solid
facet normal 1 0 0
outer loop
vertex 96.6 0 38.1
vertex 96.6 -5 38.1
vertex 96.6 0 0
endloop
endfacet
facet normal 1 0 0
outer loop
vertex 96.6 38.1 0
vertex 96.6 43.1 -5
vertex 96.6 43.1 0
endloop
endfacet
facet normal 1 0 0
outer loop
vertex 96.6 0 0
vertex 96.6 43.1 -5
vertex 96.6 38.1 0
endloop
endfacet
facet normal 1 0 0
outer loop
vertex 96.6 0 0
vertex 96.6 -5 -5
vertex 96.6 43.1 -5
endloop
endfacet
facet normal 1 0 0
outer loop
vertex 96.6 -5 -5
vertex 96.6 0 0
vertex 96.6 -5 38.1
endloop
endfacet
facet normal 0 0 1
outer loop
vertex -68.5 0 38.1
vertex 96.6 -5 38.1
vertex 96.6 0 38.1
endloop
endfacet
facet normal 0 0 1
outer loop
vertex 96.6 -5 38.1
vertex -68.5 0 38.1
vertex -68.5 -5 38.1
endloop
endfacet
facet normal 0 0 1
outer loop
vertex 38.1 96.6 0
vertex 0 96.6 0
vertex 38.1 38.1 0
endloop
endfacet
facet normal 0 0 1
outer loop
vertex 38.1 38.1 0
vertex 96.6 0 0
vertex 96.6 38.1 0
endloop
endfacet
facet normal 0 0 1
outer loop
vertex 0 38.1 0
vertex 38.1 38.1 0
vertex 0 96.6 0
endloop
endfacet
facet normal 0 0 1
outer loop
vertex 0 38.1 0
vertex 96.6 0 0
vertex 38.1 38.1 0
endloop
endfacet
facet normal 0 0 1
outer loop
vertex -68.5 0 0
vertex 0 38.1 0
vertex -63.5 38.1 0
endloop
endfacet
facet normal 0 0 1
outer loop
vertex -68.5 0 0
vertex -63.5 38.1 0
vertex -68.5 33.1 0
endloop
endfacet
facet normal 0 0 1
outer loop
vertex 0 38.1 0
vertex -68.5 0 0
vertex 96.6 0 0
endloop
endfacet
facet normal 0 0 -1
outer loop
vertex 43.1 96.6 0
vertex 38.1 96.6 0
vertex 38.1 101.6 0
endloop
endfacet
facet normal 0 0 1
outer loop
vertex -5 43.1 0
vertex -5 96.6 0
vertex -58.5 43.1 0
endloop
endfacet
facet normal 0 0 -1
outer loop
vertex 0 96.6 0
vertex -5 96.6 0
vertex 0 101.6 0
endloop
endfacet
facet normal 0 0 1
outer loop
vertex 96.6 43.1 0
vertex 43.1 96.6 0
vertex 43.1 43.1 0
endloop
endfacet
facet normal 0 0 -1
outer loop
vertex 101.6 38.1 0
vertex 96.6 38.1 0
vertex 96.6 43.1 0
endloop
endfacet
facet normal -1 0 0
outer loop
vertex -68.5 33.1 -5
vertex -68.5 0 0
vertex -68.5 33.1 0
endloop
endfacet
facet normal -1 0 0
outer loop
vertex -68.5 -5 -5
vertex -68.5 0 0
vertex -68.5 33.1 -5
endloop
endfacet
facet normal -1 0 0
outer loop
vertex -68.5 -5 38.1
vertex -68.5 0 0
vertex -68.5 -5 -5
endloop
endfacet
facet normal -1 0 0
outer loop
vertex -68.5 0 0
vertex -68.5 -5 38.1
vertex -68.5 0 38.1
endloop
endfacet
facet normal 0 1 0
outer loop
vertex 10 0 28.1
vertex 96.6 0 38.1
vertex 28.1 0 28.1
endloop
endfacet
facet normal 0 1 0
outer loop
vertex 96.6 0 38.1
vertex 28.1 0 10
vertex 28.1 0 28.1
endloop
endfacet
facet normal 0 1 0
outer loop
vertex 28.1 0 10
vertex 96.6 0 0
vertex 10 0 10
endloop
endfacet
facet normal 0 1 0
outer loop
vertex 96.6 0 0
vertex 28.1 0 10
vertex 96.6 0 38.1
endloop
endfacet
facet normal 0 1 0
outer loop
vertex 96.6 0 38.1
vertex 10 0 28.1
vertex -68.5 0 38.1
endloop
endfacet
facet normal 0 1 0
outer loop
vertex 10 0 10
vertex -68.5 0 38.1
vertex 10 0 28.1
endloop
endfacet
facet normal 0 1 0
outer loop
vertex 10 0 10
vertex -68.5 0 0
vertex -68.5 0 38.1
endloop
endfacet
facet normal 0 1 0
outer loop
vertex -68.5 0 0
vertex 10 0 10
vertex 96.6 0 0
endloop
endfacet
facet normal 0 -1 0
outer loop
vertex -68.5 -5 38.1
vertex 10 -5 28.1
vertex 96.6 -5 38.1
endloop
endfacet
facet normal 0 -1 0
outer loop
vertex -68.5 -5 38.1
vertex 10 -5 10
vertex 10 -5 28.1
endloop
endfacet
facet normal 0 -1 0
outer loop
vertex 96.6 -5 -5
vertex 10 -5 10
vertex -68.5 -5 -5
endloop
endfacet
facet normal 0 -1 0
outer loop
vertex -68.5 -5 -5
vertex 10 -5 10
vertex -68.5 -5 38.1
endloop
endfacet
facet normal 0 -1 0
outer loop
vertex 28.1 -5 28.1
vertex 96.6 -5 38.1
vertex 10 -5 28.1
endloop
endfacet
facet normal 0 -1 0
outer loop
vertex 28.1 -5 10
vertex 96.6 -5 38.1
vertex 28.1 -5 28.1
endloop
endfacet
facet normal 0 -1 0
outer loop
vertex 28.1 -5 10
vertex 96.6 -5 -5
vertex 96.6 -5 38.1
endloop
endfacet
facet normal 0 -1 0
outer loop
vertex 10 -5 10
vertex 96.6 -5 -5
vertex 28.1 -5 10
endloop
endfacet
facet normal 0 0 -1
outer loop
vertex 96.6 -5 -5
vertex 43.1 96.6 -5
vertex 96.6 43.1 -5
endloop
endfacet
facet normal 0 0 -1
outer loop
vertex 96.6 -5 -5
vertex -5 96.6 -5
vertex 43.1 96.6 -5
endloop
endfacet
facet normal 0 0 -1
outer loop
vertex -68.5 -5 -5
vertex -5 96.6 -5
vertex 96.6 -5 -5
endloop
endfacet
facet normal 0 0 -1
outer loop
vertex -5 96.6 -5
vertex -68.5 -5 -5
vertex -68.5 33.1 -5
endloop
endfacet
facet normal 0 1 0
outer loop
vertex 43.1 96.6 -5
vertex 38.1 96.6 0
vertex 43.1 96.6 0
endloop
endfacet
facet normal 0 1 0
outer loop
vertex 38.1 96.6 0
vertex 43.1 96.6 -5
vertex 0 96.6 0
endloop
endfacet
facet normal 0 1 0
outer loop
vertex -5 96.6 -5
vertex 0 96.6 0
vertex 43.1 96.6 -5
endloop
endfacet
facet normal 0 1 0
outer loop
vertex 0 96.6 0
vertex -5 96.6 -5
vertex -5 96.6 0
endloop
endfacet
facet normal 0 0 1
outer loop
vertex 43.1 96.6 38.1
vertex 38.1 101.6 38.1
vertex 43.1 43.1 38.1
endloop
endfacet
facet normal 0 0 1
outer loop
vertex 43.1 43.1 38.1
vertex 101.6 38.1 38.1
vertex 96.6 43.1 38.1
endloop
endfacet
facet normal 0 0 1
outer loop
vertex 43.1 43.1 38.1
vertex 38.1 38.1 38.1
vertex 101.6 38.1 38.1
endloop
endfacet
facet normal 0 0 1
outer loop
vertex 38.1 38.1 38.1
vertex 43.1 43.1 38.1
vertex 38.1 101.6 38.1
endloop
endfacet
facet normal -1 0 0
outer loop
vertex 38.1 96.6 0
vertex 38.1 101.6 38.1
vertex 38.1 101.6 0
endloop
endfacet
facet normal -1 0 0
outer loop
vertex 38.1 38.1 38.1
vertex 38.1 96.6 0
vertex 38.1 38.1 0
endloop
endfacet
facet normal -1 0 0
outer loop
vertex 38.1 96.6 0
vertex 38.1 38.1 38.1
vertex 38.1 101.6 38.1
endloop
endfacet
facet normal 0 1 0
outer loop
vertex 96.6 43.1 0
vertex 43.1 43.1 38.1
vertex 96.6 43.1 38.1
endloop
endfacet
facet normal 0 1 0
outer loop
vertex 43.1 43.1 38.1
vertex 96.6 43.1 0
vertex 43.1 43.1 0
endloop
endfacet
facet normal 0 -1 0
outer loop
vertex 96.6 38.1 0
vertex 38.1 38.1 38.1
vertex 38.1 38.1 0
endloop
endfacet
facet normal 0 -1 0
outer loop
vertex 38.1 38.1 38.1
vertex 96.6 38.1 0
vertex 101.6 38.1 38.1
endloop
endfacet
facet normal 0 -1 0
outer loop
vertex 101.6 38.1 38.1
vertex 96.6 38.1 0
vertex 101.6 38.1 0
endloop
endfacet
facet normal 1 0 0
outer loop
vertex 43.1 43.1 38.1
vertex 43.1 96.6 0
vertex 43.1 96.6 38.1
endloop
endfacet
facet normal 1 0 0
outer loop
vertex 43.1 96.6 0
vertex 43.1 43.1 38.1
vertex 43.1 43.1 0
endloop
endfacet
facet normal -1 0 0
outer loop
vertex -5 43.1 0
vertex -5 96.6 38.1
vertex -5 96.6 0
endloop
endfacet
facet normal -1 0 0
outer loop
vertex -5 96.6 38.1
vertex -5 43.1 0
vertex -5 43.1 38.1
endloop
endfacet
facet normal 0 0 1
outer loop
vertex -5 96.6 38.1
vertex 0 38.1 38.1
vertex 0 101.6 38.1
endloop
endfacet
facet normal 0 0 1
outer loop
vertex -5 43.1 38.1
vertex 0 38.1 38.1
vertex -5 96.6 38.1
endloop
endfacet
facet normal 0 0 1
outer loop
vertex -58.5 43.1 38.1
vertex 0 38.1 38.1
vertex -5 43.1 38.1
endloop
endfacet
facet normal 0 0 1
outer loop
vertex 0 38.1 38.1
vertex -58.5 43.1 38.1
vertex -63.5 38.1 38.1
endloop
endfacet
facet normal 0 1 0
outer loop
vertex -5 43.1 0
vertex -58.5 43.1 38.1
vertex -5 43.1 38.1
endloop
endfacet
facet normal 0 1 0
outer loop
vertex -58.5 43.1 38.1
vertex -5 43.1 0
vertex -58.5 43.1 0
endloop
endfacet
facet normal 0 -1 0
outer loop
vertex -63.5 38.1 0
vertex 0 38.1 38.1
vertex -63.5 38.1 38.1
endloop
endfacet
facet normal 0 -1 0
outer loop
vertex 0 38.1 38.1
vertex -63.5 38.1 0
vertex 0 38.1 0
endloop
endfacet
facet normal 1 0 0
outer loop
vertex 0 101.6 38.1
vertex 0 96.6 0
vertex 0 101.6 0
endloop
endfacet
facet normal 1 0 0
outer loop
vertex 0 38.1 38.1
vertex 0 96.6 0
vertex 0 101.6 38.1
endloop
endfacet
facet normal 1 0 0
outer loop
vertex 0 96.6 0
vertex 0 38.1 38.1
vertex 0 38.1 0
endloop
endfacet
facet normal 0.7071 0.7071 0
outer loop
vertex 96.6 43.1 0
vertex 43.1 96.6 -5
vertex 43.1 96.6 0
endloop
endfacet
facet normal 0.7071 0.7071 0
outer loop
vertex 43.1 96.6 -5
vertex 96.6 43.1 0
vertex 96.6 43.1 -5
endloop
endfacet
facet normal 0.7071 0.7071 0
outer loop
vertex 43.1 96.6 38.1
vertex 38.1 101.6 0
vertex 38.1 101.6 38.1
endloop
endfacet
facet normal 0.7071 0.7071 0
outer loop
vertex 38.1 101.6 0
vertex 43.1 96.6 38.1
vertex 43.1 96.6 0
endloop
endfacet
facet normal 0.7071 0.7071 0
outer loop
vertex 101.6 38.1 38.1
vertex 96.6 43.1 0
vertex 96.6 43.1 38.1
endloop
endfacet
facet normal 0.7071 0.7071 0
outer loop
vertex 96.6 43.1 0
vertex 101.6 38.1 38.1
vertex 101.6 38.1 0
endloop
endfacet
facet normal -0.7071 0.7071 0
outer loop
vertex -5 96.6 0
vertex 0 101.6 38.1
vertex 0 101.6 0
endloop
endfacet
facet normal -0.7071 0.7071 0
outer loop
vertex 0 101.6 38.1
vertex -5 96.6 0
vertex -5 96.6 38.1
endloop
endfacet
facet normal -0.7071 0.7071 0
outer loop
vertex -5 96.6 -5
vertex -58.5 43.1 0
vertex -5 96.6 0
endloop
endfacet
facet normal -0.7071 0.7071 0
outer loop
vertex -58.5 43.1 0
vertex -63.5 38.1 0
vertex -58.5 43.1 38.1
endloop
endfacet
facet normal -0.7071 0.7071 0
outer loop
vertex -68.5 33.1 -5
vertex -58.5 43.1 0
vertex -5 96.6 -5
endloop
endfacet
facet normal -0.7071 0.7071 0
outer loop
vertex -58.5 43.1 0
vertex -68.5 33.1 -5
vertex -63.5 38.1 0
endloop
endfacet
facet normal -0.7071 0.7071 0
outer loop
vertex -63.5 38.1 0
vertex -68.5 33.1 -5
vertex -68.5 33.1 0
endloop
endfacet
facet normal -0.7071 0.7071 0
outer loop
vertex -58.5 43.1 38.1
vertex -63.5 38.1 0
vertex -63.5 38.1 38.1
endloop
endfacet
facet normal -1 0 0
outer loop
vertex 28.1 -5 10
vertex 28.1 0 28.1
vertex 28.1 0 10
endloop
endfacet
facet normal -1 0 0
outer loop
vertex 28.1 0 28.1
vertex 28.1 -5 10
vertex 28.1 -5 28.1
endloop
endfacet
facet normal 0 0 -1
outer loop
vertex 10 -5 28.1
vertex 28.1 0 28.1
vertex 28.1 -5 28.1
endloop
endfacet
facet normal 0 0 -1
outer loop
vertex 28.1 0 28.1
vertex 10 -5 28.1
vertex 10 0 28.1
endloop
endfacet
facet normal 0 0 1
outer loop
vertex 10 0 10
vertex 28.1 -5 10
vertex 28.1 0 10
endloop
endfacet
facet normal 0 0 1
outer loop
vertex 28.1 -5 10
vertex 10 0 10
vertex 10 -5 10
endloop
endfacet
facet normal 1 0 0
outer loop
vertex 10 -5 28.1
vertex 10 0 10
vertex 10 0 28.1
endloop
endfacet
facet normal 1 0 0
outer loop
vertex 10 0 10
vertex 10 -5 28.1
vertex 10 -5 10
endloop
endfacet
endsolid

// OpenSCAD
e = 0.01;

l = 4 * 25.4;
h = 1.5 * 25.4;
t = 5;

w = 1.5 * 25.4;
r = 7;


difference() {
union() {
    translate([-t - (l - w), -t, 0]) cube([l + (l - w), t, h]);
    translate([-t - (l - w), -t, -t]) cube([l + (l - w), l, t]);
    translate([w, w, 0]) cube([l-w, t, h]);
    translate([w, w, 0]) cube([t, l-w, h]);
    
    translate([-t - (l - w), w, 0]) cube([l-w, t, h]);
    translate([-t, w, 0]) cube([t, l-w, h]);

}

translate([0, 0, -t-e]) linear_extrude(h + 10) polygon([[0, l + w], [l + w, 0], [l + w, l + w]]);
translate([w, 0, -t-e]) linear_extrude(h + 10) polygon([[0, l + w], [-(l + w), 0], [-(l + w), l + w]]);
translate([10, -t-e, 10]) cube([w - 20, 2 * t, h - 20]);

}
